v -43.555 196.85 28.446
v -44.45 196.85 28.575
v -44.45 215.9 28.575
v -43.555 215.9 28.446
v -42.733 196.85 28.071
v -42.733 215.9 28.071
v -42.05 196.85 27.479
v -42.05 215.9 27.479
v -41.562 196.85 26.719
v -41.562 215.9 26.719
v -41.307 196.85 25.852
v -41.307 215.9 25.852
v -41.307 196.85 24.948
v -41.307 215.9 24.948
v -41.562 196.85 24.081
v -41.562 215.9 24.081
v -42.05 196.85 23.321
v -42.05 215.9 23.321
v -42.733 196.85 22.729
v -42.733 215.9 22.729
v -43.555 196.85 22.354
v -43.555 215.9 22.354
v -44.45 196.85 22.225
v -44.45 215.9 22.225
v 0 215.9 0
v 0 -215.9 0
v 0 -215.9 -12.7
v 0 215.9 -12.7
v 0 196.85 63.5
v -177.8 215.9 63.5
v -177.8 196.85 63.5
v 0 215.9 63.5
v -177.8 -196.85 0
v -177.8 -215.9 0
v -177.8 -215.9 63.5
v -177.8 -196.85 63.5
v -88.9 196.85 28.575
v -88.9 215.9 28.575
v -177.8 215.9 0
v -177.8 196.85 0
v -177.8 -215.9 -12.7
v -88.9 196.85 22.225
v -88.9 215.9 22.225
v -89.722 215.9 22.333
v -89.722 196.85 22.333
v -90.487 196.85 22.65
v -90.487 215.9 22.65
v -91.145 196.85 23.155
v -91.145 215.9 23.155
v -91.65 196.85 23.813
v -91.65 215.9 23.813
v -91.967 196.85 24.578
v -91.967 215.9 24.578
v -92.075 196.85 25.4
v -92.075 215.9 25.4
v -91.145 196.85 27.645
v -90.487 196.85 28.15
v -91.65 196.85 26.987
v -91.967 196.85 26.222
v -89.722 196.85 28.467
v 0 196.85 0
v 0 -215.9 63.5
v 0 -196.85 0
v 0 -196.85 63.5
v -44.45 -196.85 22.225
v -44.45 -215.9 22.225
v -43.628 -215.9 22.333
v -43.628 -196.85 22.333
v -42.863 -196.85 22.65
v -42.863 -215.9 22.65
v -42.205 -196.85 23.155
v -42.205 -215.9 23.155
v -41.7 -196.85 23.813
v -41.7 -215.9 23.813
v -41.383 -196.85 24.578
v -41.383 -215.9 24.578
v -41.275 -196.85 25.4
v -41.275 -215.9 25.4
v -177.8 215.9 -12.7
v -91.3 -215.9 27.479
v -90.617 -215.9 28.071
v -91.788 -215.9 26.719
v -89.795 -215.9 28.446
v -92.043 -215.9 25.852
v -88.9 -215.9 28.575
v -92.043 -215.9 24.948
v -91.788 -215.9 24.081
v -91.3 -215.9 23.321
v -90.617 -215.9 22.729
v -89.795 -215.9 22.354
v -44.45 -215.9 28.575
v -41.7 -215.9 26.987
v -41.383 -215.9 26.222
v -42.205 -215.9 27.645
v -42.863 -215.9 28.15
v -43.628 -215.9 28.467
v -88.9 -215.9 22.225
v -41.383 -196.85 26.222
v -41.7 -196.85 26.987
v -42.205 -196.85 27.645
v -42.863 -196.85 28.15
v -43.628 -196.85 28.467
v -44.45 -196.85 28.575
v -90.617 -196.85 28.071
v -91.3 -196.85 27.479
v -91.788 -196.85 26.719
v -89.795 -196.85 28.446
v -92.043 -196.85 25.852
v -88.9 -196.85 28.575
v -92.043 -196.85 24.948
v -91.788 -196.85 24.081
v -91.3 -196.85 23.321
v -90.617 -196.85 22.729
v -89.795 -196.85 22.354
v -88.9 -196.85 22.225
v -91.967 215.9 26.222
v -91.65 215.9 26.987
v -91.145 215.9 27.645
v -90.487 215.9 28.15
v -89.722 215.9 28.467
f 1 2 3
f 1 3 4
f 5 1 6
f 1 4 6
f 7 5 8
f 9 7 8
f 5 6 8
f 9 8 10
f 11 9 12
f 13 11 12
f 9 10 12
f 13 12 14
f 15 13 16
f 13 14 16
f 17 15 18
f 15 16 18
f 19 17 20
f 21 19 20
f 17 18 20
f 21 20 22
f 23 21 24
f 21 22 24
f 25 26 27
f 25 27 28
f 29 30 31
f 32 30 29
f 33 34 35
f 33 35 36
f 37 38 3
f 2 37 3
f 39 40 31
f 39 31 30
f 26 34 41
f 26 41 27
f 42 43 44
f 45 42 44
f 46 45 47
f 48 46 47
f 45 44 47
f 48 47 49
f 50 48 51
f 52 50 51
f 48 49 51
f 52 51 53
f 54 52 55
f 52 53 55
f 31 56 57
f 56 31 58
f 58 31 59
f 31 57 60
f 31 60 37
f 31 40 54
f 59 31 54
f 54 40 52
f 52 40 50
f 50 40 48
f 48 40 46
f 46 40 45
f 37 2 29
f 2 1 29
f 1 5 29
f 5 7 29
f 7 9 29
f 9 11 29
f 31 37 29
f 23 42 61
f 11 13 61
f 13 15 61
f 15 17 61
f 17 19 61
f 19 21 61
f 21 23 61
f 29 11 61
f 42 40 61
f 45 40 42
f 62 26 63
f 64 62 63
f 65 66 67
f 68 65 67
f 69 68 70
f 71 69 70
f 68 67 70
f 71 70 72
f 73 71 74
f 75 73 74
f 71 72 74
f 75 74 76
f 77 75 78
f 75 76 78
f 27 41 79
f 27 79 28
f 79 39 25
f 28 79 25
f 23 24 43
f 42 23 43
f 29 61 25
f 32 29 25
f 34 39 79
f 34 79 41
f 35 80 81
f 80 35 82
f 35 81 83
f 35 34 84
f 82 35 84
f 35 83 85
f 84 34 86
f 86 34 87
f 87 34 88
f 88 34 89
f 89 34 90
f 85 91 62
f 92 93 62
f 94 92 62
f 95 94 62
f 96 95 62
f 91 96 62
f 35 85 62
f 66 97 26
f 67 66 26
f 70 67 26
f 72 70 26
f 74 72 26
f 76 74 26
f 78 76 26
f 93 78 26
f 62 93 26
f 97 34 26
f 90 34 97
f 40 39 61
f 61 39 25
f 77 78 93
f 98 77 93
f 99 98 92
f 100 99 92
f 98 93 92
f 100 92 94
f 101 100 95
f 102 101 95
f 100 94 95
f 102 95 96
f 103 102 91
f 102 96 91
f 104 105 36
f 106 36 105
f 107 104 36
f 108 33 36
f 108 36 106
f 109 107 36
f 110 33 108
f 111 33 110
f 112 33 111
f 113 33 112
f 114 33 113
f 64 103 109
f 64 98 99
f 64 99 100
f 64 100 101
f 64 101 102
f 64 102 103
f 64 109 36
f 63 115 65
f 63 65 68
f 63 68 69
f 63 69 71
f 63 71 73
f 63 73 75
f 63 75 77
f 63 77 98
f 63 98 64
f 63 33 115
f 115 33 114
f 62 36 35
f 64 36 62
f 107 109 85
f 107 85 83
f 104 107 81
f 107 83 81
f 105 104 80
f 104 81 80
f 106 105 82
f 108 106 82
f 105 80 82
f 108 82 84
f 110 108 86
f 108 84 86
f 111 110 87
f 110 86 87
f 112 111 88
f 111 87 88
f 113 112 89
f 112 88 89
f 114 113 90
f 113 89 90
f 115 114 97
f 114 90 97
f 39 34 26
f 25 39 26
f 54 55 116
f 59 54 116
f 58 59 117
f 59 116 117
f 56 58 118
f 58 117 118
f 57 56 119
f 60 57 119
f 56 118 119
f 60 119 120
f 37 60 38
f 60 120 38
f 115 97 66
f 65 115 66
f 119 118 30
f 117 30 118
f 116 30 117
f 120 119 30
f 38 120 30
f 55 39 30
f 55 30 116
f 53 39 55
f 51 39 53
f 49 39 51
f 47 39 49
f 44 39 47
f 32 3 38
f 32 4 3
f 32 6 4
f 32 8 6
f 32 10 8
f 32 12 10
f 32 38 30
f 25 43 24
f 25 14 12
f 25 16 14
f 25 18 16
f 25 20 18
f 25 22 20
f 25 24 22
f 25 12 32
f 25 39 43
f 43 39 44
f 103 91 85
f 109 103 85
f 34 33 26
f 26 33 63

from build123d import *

# Parameters (mm, degrees)
F0_W     = 177.8
F0_H     = 19.05
F1_DEPTH = 12.7
F2_DEPTH = 63.5
F3_DEPTH = 63.5
F5_DEPTH = 25.4
F7_DEPTH = 25.4


with BuildPart() as f1:
    # F0 (on Top) → F1 (new body)
    with BuildSketch(Plane.XY):
        with Locations((-88.9, -206.375)):
            Rectangle(F0_W, F0_H)
        Polygon((0, -196.85), (0, 0), (0, 196.85), (-177.8, 196.85), (-177.8, -196.85), align=None)
        with Locations((-88.9, 206.375)):
            Rectangle(F0_W, F0_H)
    extrude(amount=-F1_DEPTH)


with BuildPart() as f2:
    # F0 (on Top) → F2 (new body)
    with BuildSketch(Plane.XY):
        with Locations((-88.9, 206.375)):
            Rectangle(F0_W, F0_H)
    extrude(amount=F2_DEPTH)

    # F6 (on face) → F7 (cut)
    with BuildSketch(Plane(origin=(0, 215.9, 0), x_dir=(-1, 0, 0), z_dir=(0, 1, 0))):
        with BuildLine():
            Line((88.9, 28.575), (44.45, 28.575))
            ThreePointArc((44.45, 28.575), (46.695064, 27.645064), (47.625, 25.4))
            ThreePointArc((47.625, 25.4), (46.695064, 23.154936), (44.45, 22.225))
            Line((44.45, 22.225), (88.9, 22.225))
            ThreePointArc((88.9, 22.225), (85.725, 25.4), (88.9, 28.575))
        make_face()
        with BuildLine():
            ThreePointArc((47.625, 25.4), (46.695064, 27.645064), (44.45, 28.575))
            Line((44.45, 28.575), (44.45, 25.4))
            Line((44.45, 25.4), (44.45, 22.225))
            ThreePointArc((44.45, 22.225), (46.695064, 23.154936), (47.625, 25.4))
        make_face()
        with BuildLine():
            Line((44.45, 25.4), (44.45, 28.575))
            ThreePointArc((44.45, 28.575), (41.275, 25.4), (44.45, 22.225))
            Line((44.45, 22.225), (44.45, 25.4))
        make_face()
        with BuildLine():
            Line((88.9, 22.225), (88.9, 28.575))
            ThreePointArc((88.9, 28.575), (85.725, 25.4), (88.9, 22.225))
        make_face()
        with BuildLine():
            ThreePointArc((92.075, 25.4), (91.145064, 27.645064), (88.9, 28.575))
            Line((88.9, 28.575), (88.9, 22.225))
            ThreePointArc((88.9, 22.225), (91.145064, 23.154936), (92.075, 25.4))
        make_face()
    extrude(amount=-F7_DEPTH, mode=Mode.SUBTRACT)


with BuildPart() as f3:
    # F0 (on Top) → F3 (new body)
    with BuildSketch(Plane.XY):
        with Locations((-88.9, -206.375)):
            Rectangle(F0_W, F0_H)
    extrude(amount=F3_DEPTH)

    # F4 (on face) → F5 (cut)
    with BuildSketch(Plane.XZ.offset(215.9)):
        with BuildLine():
            ThreePointArc((-85.725, 25.4), (-86.654936, 27.645064), (-88.9, 28.575))
            Line((-88.9, 28.575), (-88.9, 25.4))
            Line((-88.9, 25.4), (-88.9, 22.225))
            ThreePointArc((-88.9, 22.225), (-86.654936, 23.154936), (-85.725, 25.4))
        make_face()
        with BuildLine():
            Line((-44.45, 22.225), (-44.45, 28.575))
            ThreePointArc((-44.45, 28.575), (-47.625, 25.4), (-44.45, 22.225))
        make_face()
        with BuildLine():
            ThreePointArc((-41.275, 25.4), (-42.204936, 27.645064), (-44.45, 28.575))
            Line((-44.45, 28.575), (-44.45, 22.225))
            ThreePointArc((-44.45, 22.225), (-42.204936, 23.154936), (-41.275, 25.4))
        make_face()
        with BuildLine():
            Line((-88.9, 25.4), (-88.9, 28.575))
            ThreePointArc((-88.9, 28.575), (-92.075, 25.4), (-88.9, 22.225))
            Line((-88.9, 22.225), (-88.9, 25.4))
        make_face()
        with BuildLine():
            Line((-44.45, 28.575), (-88.9, 28.575))
            ThreePointArc((-88.9, 28.575), (-86.654936, 27.645064), (-85.725, 25.4))
            ThreePointArc((-85.725, 25.4), (-86.654936, 23.154936), (-88.9, 22.225))
            Line((-88.9, 22.225), (-44.45, 22.225))
            ThreePointArc((-44.45, 22.225), (-47.625, 25.4), (-44.45, 28.575))
        make_face()
    extrude(amount=-F5_DEPTH, mode=Mode.SUBTRACT)


solid = Compound([f1.part, f2.part, f3.part])
